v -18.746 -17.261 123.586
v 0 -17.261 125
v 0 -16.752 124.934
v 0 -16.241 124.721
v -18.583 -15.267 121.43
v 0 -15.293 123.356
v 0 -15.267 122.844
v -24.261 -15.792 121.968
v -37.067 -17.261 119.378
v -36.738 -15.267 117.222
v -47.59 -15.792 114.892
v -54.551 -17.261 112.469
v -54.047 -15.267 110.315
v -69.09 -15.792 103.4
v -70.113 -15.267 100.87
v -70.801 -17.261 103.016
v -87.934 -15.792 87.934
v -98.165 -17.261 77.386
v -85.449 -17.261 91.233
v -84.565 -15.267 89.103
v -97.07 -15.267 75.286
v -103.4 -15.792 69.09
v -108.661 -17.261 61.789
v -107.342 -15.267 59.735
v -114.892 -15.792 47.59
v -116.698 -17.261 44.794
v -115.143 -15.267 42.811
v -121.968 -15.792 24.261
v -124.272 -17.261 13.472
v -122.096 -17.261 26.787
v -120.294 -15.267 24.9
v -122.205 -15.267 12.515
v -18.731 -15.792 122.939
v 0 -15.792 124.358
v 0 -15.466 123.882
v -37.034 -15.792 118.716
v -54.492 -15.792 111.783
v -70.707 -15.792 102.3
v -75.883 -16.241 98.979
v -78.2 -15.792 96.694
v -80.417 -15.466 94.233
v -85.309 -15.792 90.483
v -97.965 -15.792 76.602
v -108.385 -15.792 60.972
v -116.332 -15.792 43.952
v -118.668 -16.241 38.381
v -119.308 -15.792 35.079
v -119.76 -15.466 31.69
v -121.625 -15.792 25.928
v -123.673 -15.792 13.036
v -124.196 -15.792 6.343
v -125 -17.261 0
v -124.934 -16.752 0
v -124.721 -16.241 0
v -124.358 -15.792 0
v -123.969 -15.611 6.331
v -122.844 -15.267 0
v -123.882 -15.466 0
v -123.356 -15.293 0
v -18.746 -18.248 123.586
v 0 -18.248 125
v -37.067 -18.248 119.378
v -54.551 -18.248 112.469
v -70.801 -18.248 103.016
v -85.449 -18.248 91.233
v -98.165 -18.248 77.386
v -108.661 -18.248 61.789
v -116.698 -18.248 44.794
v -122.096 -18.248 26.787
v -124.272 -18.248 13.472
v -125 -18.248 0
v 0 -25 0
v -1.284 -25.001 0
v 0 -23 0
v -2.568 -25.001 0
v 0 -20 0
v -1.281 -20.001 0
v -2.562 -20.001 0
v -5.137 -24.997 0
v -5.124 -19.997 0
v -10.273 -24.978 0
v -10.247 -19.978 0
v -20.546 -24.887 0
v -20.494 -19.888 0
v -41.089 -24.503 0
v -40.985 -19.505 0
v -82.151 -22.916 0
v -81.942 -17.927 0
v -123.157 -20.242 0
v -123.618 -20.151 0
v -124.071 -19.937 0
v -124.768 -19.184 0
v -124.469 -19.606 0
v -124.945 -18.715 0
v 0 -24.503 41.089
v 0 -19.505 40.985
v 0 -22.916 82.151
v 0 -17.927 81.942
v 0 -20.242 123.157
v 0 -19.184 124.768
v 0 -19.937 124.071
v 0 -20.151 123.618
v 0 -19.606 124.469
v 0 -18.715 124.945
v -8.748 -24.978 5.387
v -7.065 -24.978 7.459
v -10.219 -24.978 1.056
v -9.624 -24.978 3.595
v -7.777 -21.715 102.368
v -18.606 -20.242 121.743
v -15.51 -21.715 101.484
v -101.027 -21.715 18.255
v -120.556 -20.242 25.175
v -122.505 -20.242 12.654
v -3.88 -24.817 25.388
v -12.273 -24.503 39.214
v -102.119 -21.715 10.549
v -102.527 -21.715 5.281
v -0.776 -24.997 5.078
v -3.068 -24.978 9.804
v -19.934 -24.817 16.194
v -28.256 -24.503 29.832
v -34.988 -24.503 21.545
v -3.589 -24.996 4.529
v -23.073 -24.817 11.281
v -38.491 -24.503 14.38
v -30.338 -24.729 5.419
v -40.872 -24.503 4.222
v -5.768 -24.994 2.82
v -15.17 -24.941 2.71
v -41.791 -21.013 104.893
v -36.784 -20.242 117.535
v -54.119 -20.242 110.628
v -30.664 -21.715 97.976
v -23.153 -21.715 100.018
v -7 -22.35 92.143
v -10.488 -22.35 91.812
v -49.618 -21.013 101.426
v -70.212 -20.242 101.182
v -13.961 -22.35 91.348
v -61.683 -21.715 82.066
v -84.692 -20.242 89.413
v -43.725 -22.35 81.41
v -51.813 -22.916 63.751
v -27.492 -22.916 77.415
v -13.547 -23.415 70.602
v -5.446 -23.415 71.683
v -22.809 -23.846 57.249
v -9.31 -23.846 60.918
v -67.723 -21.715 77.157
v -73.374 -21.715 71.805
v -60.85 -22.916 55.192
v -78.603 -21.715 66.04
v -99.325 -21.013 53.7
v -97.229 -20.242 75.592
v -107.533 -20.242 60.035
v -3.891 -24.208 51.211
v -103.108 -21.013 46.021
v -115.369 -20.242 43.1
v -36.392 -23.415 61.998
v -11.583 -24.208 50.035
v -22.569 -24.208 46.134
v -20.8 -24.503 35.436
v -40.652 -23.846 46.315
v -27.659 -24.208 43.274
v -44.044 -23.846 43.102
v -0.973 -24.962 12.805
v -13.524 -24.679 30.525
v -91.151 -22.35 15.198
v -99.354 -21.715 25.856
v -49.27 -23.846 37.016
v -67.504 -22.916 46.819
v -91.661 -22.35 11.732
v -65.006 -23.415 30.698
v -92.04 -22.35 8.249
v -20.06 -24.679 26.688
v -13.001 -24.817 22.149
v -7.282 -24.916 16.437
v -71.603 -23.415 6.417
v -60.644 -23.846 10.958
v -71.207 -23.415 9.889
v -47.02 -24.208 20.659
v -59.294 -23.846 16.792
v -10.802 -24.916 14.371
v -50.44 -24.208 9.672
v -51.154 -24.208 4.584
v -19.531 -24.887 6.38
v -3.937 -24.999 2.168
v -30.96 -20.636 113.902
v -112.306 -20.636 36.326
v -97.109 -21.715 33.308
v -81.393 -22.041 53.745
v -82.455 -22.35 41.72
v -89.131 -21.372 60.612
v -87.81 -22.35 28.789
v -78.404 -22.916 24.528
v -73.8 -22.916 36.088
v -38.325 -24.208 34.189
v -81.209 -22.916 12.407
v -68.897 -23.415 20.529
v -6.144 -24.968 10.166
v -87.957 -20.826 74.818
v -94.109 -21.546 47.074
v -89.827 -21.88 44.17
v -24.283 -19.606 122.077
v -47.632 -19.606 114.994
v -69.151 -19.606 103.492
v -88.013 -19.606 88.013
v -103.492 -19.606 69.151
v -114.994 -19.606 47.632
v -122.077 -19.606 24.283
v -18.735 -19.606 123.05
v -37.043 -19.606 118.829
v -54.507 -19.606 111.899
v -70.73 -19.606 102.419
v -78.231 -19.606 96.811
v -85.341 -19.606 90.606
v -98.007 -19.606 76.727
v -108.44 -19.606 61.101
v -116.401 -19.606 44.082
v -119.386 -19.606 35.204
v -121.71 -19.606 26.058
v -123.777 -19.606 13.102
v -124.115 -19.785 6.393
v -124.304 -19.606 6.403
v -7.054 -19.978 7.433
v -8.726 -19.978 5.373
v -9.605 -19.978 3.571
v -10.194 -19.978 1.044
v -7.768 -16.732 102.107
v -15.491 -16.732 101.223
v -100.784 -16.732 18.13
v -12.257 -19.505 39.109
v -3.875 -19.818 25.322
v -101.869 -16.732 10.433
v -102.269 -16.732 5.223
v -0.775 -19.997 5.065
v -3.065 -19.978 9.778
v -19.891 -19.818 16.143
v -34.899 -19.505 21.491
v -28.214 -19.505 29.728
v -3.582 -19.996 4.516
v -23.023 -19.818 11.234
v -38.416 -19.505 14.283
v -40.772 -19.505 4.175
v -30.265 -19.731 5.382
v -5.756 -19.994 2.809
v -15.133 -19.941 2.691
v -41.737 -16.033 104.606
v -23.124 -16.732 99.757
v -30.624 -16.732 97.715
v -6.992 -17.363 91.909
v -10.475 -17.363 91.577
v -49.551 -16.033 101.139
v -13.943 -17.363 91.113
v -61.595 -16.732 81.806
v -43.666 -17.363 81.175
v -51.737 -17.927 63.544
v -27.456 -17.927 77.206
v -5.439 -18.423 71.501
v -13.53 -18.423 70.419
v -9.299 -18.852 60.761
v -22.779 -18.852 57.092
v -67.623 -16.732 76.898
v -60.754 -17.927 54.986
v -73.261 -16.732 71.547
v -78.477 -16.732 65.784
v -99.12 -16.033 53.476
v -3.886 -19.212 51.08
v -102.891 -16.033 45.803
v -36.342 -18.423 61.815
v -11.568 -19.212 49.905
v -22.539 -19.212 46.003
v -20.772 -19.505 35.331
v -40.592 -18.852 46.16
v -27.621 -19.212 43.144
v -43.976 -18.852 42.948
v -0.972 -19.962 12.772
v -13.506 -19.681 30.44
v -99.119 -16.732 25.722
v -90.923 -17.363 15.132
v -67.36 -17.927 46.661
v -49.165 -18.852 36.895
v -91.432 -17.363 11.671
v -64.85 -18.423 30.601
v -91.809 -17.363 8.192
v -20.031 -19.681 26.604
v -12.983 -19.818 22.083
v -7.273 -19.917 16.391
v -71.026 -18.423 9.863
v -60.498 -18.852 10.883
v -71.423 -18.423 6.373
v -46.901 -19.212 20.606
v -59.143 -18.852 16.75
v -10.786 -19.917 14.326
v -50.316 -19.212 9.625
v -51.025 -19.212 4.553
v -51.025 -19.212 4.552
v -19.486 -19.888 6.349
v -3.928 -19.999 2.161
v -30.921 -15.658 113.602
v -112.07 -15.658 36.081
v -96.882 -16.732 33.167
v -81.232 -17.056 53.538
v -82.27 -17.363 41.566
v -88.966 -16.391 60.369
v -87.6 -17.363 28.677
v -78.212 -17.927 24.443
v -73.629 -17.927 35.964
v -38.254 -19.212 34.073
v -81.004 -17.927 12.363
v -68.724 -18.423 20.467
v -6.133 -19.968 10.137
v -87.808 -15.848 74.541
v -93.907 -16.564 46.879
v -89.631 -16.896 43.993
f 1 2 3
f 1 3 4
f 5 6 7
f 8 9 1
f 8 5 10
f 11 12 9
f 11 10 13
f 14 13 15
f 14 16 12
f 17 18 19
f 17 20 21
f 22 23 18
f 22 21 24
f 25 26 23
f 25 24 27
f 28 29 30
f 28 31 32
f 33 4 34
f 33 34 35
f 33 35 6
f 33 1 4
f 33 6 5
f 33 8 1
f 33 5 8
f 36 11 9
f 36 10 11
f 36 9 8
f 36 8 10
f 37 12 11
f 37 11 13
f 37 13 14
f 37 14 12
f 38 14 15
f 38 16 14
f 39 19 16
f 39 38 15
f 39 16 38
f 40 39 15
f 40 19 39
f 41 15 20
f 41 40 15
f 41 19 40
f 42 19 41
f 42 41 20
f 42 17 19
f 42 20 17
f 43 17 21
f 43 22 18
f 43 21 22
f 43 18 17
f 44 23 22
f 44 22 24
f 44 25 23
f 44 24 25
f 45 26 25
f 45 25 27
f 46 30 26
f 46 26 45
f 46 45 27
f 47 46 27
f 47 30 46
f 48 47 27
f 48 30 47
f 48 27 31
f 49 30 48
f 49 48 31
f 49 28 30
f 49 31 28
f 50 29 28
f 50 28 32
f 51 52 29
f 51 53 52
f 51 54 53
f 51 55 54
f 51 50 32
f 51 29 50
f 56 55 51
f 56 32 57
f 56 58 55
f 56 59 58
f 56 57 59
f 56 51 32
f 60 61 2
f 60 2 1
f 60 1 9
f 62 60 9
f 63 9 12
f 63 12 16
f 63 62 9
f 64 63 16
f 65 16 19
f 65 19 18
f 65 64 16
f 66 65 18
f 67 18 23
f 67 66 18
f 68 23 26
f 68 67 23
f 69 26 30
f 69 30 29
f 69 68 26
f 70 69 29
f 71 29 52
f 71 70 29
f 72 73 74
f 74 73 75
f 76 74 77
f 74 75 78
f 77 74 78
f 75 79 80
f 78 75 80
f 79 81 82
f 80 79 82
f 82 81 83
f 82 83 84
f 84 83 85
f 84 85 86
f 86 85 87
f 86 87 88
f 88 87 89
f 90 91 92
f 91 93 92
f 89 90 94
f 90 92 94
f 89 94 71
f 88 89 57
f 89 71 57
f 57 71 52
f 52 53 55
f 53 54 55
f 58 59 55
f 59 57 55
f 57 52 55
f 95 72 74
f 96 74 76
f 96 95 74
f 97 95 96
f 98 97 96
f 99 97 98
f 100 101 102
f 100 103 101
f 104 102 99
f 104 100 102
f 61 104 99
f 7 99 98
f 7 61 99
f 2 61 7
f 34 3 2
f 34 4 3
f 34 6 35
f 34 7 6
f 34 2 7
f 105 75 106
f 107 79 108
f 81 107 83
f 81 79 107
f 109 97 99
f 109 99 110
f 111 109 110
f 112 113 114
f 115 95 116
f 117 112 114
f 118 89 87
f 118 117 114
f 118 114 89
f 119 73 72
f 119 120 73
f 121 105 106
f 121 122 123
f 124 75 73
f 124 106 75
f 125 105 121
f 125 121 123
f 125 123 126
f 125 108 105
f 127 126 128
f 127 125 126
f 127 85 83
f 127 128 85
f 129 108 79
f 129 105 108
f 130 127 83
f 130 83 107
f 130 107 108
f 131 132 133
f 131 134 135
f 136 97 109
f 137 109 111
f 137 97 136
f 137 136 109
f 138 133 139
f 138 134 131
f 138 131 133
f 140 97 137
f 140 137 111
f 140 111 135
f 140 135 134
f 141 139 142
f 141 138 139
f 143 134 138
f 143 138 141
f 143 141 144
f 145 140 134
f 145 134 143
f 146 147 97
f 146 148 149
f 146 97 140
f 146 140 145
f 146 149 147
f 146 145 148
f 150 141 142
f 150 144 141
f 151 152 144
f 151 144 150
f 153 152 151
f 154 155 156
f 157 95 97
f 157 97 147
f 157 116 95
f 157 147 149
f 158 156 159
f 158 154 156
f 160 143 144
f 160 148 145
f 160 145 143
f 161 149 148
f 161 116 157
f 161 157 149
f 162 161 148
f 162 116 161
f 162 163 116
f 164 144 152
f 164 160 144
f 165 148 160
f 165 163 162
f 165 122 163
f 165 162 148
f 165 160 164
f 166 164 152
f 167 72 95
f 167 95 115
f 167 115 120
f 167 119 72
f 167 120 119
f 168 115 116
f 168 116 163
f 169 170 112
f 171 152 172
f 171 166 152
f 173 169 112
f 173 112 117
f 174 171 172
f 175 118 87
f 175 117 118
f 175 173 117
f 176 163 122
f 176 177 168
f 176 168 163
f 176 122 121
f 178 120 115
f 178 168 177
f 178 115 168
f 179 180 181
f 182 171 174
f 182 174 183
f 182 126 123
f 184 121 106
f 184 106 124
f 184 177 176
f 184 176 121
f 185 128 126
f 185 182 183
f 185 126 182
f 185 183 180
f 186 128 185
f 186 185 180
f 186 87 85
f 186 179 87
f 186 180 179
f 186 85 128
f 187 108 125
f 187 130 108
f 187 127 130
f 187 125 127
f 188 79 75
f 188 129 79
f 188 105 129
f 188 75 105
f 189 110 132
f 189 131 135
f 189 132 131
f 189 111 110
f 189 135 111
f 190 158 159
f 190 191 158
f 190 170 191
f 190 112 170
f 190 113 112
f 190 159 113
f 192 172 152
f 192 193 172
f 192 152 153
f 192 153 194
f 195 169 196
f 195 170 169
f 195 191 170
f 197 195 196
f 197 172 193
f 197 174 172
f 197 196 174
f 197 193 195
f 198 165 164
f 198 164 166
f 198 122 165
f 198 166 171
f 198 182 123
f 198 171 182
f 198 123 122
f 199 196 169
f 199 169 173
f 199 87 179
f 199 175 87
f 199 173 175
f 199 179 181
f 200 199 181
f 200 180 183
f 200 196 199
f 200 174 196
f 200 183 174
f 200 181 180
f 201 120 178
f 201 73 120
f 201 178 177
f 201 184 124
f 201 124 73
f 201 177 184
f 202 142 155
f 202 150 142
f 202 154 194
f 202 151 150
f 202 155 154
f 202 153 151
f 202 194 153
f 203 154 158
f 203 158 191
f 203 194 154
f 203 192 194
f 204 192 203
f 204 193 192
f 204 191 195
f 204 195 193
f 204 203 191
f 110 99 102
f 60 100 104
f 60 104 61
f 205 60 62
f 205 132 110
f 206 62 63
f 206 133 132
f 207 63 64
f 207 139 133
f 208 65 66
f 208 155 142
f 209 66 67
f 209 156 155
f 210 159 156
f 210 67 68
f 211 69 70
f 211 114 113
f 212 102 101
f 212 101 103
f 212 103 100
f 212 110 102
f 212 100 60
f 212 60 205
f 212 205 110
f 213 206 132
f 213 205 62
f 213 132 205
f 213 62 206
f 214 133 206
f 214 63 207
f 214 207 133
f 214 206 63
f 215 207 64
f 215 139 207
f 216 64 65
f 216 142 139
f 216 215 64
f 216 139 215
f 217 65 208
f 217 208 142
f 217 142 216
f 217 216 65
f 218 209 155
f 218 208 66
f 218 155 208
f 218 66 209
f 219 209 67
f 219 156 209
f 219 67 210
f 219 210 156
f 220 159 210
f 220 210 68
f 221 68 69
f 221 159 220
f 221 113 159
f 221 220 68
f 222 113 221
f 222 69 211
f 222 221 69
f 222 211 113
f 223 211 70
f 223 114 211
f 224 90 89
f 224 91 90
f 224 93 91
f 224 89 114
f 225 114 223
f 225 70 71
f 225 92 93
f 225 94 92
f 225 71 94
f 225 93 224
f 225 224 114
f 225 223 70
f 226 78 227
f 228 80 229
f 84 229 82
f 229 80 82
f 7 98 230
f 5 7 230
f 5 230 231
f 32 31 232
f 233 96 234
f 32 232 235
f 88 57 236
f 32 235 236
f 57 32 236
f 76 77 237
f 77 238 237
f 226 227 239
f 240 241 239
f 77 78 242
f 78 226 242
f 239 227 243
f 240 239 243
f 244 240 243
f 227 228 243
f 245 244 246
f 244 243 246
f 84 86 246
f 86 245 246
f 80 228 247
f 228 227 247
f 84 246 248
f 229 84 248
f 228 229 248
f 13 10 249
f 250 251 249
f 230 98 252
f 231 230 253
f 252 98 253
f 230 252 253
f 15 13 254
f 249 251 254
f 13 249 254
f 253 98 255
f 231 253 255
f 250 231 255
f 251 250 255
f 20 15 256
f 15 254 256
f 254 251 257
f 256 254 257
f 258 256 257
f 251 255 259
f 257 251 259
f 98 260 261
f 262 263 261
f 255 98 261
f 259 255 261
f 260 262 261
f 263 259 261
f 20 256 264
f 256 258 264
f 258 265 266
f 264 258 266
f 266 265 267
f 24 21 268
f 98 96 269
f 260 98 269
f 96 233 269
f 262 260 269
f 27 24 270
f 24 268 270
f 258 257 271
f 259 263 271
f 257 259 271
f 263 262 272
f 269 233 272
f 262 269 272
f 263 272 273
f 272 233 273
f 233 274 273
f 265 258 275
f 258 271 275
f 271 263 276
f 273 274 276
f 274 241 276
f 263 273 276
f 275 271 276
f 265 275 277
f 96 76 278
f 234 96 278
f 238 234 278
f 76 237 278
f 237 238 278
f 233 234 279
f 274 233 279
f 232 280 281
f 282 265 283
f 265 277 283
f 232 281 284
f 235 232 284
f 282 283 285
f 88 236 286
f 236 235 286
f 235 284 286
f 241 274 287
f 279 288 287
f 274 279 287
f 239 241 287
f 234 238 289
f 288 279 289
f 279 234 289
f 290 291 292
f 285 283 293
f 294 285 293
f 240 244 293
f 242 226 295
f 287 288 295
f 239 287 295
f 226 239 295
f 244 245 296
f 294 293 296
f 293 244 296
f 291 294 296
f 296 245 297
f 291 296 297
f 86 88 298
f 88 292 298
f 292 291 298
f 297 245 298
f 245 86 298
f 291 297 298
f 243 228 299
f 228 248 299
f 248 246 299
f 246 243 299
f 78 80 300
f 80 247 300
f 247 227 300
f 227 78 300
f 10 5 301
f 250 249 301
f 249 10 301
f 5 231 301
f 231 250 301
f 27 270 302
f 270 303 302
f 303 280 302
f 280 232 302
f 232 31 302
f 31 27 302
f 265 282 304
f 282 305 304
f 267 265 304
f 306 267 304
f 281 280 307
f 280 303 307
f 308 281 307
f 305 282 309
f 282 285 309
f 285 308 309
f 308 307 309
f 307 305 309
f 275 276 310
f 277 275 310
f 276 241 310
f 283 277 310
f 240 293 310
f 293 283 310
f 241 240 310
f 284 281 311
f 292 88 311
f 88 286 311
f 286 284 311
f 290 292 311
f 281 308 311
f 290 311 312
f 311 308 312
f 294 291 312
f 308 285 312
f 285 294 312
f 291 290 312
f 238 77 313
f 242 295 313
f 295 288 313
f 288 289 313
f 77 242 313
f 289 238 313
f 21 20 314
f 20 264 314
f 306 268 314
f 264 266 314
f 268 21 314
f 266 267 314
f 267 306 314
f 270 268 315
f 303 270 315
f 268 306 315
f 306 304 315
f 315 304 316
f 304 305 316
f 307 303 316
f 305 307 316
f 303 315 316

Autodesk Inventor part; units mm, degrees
ref_plane "YZ Plane" through (0, 0, 0) normal (1, 0, 0) x (0, 1, 0)
ref_plane "XZ Plane" through (0, 0, 0) normal (0, 1, 0) x (-1, 0, 0)
ref_plane "XY Plane" through (0, 0, 0) normal (0, 0, 1) x (1, 0, 0)
sketch "Boceto1" plane through (0, 0, 0) normal (1, 0, 0) x (0, 1, 0)
  line L0 (0, 0) -> (0, 125)
  line L1 (0, 0) -> (125, 0) construction
  line L2 (0, 0) -> (0, -125)
  line L3 (0, 0) -> (125, 0) construction
  line L4 (0, 0) -> (-20, 0)
  line L5 (0, 0) -> (20, 0) construction
  line L6 (0, 0) -> (500, 0) construction
  line L7 (0, 0) -> (-20, 0)
  line L8 (0, 0) -> (20, 0) construction
  line L9 (0, 0) -> (0, -246.4363)
  line L10 (0, 0) -> (246.4363, 0) construction
  line L11 (0, 0) -> (0, 250)
  line L12 (0, 0) -> (250, 0) construction
  arc A0 (0, 250) -> (0, -246.4363) centre (1530.2267, 1.7819) ccw
  line L13 (0, 125) -> (-100, 125)
  line L14 (0, 125) -> (100, 125) construction
  line L15 (0, 250) -> (-5, 250)
  line L16 (0, 250) -> (5, 250) construction
  line L17 (0, -246.4363) -> (-5, -246.4363)
  line L18 (-20, 0) -> (-23, 0)
  line L19 (-20, 0) -> (-17, 0) construction
  line L20 (-20, 0) -> (-25, 0)
  line L21 (-20, 0) -> (-15, 0) construction
  arc A1 (-5, 250) -> (-5, -246.4363) centre (1525.2267, 1.7819) ccw
  point P0 (-20.0963, 125)
  point P1 (-15.0963, 125)
  dimension "d14" = 100
  dimension "d15" = 180
  dimension "d16" = 5
  dimension "d17" = 180
  dimension "d18" = 5
  dimension "d19" = 3
  dimension "d20" = 180
  dimension "d21" = 5
  dimension "d22" = 180
revolve "Revolución1" add sketch "Boceto1" angle 90 about axis through (0, -20, 0) along (0, -1, 0) contours L18 L20 A1 L13 A0
fillet "Empalme1" radius 2 2 edges at (-88.3883, -15.0963, 88.3883) (-88.3883, -20.0963, 88.3883)
